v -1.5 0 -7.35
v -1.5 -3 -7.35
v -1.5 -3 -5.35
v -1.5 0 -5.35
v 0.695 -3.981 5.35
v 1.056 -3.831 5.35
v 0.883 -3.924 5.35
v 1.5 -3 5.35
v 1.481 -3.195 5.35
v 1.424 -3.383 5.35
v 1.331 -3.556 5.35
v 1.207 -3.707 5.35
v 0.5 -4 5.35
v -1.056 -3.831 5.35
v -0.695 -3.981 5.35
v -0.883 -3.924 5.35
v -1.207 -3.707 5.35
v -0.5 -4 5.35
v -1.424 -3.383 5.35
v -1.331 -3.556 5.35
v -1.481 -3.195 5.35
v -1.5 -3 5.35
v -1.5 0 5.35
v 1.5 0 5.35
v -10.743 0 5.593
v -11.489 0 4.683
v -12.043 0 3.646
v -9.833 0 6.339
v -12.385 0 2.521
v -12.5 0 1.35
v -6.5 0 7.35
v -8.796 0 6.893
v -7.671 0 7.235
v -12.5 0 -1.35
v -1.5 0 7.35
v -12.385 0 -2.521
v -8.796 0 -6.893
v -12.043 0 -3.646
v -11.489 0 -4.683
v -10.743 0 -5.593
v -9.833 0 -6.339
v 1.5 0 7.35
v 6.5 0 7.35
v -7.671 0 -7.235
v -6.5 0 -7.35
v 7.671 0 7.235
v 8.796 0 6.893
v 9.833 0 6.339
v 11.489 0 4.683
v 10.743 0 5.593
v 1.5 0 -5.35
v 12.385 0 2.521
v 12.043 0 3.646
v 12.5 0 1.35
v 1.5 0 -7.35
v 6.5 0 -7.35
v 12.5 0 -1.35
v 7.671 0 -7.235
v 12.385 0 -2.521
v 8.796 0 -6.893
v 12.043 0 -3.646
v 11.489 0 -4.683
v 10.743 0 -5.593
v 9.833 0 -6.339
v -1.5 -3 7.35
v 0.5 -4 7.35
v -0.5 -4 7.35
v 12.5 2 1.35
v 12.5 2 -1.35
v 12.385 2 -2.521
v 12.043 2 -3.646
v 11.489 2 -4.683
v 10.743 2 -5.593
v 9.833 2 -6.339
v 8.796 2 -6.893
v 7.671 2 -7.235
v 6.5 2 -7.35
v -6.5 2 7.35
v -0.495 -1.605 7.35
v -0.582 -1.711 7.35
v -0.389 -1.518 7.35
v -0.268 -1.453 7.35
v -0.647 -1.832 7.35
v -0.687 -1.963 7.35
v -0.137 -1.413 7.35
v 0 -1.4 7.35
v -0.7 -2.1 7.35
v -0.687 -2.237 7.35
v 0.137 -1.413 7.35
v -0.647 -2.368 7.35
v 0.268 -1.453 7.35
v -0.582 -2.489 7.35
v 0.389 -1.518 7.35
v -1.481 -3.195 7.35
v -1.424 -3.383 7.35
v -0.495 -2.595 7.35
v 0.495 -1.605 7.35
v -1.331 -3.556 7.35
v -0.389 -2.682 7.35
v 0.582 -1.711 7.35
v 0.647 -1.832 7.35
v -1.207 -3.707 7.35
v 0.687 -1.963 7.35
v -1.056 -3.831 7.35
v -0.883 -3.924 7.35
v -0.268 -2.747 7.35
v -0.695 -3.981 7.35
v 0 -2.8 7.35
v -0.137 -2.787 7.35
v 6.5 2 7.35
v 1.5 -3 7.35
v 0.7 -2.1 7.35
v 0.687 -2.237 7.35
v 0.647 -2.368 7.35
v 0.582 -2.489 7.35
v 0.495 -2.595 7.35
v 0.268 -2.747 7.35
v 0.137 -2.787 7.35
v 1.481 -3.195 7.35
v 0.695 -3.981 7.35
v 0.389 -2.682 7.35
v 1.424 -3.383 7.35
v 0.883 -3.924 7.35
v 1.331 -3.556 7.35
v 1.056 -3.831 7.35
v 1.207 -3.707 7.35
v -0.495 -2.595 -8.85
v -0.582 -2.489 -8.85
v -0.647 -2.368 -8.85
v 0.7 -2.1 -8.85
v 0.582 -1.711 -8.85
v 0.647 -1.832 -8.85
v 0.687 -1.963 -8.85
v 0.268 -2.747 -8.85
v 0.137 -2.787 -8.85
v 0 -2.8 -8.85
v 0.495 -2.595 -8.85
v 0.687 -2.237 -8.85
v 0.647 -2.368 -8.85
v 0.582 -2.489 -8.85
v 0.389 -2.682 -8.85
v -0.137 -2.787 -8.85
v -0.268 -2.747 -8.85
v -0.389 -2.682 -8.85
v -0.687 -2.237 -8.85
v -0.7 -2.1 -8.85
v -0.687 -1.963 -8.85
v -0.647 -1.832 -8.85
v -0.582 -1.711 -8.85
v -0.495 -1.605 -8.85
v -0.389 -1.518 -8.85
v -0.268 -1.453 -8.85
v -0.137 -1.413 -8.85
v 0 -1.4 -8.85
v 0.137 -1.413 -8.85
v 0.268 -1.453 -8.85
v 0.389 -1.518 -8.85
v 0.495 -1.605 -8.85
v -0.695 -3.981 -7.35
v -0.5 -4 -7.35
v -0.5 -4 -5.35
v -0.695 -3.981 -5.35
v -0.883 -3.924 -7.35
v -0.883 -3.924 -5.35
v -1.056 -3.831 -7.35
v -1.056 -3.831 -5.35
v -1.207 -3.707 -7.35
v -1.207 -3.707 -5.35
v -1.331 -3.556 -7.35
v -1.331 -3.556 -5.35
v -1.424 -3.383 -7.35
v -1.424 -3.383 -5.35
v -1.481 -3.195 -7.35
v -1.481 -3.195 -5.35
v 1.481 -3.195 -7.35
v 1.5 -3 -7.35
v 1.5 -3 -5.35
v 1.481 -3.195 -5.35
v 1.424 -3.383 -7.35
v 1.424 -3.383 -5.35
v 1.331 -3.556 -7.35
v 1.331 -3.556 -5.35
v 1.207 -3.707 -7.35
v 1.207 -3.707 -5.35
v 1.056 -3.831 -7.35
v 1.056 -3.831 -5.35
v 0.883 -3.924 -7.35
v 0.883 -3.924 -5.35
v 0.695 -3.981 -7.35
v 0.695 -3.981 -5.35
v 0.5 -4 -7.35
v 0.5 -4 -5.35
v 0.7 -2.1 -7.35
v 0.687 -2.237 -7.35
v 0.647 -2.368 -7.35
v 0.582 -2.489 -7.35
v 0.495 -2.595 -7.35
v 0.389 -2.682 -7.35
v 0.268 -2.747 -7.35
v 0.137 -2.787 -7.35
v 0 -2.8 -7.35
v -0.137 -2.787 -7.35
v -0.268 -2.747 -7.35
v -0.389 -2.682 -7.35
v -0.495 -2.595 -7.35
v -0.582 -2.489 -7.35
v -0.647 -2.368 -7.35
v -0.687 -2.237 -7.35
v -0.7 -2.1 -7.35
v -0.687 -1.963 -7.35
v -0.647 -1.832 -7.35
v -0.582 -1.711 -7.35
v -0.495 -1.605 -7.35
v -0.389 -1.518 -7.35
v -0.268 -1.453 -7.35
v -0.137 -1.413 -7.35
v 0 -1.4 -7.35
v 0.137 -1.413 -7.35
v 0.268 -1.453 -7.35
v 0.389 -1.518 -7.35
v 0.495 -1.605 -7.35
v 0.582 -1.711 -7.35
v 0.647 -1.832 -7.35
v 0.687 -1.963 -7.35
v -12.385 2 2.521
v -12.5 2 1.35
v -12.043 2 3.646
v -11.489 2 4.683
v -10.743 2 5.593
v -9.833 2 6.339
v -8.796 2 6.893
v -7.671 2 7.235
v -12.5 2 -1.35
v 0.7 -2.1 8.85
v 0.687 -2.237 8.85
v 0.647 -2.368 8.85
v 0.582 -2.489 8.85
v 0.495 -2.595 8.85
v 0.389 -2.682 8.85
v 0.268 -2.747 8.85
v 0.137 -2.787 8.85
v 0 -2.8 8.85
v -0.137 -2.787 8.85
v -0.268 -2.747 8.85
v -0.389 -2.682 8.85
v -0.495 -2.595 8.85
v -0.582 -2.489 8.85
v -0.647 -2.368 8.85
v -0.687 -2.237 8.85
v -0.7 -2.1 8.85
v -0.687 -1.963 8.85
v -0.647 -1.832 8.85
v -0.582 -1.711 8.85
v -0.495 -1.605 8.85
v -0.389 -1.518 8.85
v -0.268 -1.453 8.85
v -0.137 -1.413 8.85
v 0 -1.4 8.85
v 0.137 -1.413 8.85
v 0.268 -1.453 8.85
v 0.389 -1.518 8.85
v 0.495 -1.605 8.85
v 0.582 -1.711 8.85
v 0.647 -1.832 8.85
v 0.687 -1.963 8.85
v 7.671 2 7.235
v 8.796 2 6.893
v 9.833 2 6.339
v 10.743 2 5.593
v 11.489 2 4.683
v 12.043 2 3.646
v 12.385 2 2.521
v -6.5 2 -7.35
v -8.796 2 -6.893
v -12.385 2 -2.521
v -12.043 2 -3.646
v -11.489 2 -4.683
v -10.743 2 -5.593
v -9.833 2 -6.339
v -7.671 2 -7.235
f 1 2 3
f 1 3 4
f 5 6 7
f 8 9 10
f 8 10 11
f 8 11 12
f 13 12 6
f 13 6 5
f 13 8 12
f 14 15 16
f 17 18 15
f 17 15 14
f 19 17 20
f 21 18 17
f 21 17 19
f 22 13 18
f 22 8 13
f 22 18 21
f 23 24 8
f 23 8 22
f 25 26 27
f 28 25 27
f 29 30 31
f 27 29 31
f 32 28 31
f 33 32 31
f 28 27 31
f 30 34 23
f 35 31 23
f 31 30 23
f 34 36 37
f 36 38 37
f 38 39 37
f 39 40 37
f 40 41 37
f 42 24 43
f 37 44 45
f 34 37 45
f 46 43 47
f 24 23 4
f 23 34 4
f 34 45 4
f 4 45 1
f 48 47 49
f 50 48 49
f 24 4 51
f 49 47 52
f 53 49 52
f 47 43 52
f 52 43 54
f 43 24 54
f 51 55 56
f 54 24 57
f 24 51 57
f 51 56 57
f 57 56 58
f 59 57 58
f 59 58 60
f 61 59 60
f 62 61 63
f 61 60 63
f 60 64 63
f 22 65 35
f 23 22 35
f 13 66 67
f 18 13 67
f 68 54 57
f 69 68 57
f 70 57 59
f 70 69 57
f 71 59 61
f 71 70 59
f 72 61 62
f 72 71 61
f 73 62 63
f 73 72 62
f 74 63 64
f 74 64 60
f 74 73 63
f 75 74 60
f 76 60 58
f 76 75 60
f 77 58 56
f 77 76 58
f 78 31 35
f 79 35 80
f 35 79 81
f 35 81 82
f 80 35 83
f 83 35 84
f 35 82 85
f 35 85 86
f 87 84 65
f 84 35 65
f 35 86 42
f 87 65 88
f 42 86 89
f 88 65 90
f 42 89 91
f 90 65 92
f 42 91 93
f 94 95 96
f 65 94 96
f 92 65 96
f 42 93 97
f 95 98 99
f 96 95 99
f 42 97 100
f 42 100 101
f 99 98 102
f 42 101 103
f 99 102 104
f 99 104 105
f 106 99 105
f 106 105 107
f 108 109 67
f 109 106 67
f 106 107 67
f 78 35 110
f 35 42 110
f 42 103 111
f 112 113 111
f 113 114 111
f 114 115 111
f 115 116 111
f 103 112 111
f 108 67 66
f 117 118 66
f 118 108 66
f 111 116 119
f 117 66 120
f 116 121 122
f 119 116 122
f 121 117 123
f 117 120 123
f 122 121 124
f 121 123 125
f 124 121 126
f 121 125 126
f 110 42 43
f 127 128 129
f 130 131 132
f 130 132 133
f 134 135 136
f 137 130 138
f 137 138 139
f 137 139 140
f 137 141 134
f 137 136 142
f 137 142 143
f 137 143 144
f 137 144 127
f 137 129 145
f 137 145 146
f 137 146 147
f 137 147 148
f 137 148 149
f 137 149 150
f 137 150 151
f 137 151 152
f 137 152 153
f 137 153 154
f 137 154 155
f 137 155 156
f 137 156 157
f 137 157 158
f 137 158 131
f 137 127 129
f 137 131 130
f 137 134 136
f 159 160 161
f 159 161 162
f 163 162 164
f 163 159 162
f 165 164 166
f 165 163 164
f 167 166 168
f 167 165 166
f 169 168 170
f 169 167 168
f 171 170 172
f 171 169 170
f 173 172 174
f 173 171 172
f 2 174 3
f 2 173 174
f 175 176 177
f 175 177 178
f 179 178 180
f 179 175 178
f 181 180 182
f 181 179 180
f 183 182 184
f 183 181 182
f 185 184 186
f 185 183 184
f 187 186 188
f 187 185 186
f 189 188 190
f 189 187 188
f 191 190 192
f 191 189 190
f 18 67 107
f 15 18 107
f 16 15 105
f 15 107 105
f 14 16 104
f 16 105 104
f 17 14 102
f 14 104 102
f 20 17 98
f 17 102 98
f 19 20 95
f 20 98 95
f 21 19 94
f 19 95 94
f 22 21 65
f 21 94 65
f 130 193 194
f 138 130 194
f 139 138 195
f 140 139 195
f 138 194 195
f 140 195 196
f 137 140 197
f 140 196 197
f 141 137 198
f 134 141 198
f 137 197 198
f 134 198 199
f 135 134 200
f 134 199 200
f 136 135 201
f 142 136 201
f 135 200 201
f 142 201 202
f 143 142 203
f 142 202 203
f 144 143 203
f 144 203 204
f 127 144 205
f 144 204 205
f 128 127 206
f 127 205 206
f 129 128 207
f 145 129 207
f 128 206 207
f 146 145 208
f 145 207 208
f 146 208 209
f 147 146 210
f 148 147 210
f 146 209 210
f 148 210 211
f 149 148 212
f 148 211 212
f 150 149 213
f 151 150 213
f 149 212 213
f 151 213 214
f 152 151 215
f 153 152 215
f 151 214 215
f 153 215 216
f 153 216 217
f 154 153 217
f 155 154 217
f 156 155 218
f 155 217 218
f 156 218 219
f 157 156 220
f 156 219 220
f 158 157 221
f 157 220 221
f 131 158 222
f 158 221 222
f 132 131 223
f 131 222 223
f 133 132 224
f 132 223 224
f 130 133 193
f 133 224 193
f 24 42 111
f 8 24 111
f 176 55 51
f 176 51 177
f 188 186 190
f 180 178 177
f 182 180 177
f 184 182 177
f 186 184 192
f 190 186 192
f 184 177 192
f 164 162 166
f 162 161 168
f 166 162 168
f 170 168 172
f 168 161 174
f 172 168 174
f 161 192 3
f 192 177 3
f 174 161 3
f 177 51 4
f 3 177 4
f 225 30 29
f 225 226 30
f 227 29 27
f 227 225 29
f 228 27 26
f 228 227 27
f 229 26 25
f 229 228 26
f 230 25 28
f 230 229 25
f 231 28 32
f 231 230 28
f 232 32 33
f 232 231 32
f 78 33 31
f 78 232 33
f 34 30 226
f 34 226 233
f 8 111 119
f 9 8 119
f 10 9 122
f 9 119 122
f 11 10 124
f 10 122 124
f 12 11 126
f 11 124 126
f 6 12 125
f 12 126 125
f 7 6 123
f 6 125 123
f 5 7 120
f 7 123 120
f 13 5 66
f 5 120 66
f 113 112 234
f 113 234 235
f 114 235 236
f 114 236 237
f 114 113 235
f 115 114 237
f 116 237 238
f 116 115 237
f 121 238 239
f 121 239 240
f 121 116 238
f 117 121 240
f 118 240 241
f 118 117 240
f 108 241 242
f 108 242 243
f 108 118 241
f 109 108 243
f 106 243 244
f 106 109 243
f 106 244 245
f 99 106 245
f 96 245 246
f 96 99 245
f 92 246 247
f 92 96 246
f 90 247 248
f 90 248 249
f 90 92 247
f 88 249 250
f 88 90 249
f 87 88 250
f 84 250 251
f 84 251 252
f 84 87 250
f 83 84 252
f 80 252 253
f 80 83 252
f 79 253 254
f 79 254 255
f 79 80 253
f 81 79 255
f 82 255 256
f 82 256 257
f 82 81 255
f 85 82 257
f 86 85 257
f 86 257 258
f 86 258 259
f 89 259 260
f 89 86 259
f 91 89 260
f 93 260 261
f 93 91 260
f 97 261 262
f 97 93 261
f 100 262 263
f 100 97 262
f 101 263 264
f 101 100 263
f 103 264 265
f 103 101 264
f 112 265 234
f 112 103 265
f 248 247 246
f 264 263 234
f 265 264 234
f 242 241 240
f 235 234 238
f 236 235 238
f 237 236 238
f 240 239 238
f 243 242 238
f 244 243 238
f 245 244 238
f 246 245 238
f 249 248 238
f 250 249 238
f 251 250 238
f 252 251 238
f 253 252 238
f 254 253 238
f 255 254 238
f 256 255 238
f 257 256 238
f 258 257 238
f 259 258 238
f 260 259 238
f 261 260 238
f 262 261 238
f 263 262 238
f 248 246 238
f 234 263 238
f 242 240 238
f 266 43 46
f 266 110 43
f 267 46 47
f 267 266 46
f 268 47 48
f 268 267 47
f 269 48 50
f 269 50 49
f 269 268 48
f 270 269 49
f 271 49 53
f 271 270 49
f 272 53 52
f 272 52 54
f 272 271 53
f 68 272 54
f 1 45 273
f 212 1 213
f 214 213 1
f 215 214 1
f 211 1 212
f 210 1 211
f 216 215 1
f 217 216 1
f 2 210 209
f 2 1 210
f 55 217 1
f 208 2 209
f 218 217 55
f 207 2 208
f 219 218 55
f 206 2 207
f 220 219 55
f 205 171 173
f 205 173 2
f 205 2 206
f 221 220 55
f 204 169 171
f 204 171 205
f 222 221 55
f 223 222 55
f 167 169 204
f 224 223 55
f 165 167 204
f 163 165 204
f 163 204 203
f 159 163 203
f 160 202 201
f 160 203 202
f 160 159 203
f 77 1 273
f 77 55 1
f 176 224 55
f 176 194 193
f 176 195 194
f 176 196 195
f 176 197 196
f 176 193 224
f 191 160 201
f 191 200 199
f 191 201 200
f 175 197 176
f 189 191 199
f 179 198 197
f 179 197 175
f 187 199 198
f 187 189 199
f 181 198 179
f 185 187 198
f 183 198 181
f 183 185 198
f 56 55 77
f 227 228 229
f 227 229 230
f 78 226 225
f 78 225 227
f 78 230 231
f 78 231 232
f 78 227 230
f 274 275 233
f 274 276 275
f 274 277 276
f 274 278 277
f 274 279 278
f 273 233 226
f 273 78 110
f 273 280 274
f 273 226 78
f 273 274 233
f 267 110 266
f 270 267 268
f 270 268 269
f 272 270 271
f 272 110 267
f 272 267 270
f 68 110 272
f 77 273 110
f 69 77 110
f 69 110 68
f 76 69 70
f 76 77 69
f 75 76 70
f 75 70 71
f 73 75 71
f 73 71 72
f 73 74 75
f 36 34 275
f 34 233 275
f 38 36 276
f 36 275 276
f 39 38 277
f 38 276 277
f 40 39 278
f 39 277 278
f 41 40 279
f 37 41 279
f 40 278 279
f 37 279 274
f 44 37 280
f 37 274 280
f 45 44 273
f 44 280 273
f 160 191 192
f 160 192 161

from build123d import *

# Parameters (mm, degrees)
SKETCH1_W           = 25
SKETCH1_H           = 14.7
BOSS_EXTRUDE1_DEPTH = 2
FILLET1_R           = 6
BOSS_EXTRUDE6_DEPTH = 2
SKETCH5_R           = 0.7
BOSS_EXTRUDE7_DEPTH = 1.5


with BuildPart() as part:
    # Sketch1 → Boss-Extrude1 (new body)
    with BuildSketch(Plane(origin=(0, 0, 0), x_dir=(1, 0, 0), z_dir=(0, 1, 0))):
        Rectangle(SKETCH1_W, SKETCH1_H)
    extrude(amount=BOSS_EXTRUDE1_DEPTH)

    # Fillet1
    fillet1_edges = [part.edges().sort_by_distance(p)[0] for p in [
        (12.5, 1, 7.35),
        (-12.5, 1, 7.35),
        (-12.5, 1, -7.35),
        (12.5, 1, -7.35),
    ]]
    fillet(fillet1_edges, radius=FILLET1_R)

    # Sketch3 → Boss-Extrude6 (add)
    with BuildSketch(Plane(origin=(0, 0, -7.35), x_dir=(-1, 0, 0), z_dir=(0, 0, -1))):
        with BuildLine():
            Line((-1.5, 0), (-1.5, -3))
            ThreePointArc((-1.5, -3), (-1.207106781, -3.707106781), (-0.5, -4))
            Line((-0.5, -4), (0.5, -4))
            ThreePointArc((0.5, -4), (1.207106781, -3.707106781), (1.5, -3))
            Line((1.5, -3), (1.5, 0))
            Line((1.5, 0), (-1.5, 0))
        make_face()
    boss_extrude6 = extrude(amount=-BOSS_EXTRUDE6_DEPTH)

    # Sketch5 → Boss-Extrude7 (add)
    with BuildSketch(Plane(origin=(0, 0, -7.35), x_dir=(-1, 0, 0), z_dir=(0, 0, -1))):
        with Locations(Location((0, -2.1, 0), (0, 0, 180))):  # turned: the seam where the file's is
            Circle(SKETCH5_R)
    boss_extrude7 = extrude(amount=BOSS_EXTRUDE7_DEPTH)

    # Mirror3: Boss-Extrude6, Boss-Extrude7 across plane
    add(boss_extrude6.mirror(Plane.XY))
    add(boss_extrude7.mirror(Plane.XY))


solid = part.part
